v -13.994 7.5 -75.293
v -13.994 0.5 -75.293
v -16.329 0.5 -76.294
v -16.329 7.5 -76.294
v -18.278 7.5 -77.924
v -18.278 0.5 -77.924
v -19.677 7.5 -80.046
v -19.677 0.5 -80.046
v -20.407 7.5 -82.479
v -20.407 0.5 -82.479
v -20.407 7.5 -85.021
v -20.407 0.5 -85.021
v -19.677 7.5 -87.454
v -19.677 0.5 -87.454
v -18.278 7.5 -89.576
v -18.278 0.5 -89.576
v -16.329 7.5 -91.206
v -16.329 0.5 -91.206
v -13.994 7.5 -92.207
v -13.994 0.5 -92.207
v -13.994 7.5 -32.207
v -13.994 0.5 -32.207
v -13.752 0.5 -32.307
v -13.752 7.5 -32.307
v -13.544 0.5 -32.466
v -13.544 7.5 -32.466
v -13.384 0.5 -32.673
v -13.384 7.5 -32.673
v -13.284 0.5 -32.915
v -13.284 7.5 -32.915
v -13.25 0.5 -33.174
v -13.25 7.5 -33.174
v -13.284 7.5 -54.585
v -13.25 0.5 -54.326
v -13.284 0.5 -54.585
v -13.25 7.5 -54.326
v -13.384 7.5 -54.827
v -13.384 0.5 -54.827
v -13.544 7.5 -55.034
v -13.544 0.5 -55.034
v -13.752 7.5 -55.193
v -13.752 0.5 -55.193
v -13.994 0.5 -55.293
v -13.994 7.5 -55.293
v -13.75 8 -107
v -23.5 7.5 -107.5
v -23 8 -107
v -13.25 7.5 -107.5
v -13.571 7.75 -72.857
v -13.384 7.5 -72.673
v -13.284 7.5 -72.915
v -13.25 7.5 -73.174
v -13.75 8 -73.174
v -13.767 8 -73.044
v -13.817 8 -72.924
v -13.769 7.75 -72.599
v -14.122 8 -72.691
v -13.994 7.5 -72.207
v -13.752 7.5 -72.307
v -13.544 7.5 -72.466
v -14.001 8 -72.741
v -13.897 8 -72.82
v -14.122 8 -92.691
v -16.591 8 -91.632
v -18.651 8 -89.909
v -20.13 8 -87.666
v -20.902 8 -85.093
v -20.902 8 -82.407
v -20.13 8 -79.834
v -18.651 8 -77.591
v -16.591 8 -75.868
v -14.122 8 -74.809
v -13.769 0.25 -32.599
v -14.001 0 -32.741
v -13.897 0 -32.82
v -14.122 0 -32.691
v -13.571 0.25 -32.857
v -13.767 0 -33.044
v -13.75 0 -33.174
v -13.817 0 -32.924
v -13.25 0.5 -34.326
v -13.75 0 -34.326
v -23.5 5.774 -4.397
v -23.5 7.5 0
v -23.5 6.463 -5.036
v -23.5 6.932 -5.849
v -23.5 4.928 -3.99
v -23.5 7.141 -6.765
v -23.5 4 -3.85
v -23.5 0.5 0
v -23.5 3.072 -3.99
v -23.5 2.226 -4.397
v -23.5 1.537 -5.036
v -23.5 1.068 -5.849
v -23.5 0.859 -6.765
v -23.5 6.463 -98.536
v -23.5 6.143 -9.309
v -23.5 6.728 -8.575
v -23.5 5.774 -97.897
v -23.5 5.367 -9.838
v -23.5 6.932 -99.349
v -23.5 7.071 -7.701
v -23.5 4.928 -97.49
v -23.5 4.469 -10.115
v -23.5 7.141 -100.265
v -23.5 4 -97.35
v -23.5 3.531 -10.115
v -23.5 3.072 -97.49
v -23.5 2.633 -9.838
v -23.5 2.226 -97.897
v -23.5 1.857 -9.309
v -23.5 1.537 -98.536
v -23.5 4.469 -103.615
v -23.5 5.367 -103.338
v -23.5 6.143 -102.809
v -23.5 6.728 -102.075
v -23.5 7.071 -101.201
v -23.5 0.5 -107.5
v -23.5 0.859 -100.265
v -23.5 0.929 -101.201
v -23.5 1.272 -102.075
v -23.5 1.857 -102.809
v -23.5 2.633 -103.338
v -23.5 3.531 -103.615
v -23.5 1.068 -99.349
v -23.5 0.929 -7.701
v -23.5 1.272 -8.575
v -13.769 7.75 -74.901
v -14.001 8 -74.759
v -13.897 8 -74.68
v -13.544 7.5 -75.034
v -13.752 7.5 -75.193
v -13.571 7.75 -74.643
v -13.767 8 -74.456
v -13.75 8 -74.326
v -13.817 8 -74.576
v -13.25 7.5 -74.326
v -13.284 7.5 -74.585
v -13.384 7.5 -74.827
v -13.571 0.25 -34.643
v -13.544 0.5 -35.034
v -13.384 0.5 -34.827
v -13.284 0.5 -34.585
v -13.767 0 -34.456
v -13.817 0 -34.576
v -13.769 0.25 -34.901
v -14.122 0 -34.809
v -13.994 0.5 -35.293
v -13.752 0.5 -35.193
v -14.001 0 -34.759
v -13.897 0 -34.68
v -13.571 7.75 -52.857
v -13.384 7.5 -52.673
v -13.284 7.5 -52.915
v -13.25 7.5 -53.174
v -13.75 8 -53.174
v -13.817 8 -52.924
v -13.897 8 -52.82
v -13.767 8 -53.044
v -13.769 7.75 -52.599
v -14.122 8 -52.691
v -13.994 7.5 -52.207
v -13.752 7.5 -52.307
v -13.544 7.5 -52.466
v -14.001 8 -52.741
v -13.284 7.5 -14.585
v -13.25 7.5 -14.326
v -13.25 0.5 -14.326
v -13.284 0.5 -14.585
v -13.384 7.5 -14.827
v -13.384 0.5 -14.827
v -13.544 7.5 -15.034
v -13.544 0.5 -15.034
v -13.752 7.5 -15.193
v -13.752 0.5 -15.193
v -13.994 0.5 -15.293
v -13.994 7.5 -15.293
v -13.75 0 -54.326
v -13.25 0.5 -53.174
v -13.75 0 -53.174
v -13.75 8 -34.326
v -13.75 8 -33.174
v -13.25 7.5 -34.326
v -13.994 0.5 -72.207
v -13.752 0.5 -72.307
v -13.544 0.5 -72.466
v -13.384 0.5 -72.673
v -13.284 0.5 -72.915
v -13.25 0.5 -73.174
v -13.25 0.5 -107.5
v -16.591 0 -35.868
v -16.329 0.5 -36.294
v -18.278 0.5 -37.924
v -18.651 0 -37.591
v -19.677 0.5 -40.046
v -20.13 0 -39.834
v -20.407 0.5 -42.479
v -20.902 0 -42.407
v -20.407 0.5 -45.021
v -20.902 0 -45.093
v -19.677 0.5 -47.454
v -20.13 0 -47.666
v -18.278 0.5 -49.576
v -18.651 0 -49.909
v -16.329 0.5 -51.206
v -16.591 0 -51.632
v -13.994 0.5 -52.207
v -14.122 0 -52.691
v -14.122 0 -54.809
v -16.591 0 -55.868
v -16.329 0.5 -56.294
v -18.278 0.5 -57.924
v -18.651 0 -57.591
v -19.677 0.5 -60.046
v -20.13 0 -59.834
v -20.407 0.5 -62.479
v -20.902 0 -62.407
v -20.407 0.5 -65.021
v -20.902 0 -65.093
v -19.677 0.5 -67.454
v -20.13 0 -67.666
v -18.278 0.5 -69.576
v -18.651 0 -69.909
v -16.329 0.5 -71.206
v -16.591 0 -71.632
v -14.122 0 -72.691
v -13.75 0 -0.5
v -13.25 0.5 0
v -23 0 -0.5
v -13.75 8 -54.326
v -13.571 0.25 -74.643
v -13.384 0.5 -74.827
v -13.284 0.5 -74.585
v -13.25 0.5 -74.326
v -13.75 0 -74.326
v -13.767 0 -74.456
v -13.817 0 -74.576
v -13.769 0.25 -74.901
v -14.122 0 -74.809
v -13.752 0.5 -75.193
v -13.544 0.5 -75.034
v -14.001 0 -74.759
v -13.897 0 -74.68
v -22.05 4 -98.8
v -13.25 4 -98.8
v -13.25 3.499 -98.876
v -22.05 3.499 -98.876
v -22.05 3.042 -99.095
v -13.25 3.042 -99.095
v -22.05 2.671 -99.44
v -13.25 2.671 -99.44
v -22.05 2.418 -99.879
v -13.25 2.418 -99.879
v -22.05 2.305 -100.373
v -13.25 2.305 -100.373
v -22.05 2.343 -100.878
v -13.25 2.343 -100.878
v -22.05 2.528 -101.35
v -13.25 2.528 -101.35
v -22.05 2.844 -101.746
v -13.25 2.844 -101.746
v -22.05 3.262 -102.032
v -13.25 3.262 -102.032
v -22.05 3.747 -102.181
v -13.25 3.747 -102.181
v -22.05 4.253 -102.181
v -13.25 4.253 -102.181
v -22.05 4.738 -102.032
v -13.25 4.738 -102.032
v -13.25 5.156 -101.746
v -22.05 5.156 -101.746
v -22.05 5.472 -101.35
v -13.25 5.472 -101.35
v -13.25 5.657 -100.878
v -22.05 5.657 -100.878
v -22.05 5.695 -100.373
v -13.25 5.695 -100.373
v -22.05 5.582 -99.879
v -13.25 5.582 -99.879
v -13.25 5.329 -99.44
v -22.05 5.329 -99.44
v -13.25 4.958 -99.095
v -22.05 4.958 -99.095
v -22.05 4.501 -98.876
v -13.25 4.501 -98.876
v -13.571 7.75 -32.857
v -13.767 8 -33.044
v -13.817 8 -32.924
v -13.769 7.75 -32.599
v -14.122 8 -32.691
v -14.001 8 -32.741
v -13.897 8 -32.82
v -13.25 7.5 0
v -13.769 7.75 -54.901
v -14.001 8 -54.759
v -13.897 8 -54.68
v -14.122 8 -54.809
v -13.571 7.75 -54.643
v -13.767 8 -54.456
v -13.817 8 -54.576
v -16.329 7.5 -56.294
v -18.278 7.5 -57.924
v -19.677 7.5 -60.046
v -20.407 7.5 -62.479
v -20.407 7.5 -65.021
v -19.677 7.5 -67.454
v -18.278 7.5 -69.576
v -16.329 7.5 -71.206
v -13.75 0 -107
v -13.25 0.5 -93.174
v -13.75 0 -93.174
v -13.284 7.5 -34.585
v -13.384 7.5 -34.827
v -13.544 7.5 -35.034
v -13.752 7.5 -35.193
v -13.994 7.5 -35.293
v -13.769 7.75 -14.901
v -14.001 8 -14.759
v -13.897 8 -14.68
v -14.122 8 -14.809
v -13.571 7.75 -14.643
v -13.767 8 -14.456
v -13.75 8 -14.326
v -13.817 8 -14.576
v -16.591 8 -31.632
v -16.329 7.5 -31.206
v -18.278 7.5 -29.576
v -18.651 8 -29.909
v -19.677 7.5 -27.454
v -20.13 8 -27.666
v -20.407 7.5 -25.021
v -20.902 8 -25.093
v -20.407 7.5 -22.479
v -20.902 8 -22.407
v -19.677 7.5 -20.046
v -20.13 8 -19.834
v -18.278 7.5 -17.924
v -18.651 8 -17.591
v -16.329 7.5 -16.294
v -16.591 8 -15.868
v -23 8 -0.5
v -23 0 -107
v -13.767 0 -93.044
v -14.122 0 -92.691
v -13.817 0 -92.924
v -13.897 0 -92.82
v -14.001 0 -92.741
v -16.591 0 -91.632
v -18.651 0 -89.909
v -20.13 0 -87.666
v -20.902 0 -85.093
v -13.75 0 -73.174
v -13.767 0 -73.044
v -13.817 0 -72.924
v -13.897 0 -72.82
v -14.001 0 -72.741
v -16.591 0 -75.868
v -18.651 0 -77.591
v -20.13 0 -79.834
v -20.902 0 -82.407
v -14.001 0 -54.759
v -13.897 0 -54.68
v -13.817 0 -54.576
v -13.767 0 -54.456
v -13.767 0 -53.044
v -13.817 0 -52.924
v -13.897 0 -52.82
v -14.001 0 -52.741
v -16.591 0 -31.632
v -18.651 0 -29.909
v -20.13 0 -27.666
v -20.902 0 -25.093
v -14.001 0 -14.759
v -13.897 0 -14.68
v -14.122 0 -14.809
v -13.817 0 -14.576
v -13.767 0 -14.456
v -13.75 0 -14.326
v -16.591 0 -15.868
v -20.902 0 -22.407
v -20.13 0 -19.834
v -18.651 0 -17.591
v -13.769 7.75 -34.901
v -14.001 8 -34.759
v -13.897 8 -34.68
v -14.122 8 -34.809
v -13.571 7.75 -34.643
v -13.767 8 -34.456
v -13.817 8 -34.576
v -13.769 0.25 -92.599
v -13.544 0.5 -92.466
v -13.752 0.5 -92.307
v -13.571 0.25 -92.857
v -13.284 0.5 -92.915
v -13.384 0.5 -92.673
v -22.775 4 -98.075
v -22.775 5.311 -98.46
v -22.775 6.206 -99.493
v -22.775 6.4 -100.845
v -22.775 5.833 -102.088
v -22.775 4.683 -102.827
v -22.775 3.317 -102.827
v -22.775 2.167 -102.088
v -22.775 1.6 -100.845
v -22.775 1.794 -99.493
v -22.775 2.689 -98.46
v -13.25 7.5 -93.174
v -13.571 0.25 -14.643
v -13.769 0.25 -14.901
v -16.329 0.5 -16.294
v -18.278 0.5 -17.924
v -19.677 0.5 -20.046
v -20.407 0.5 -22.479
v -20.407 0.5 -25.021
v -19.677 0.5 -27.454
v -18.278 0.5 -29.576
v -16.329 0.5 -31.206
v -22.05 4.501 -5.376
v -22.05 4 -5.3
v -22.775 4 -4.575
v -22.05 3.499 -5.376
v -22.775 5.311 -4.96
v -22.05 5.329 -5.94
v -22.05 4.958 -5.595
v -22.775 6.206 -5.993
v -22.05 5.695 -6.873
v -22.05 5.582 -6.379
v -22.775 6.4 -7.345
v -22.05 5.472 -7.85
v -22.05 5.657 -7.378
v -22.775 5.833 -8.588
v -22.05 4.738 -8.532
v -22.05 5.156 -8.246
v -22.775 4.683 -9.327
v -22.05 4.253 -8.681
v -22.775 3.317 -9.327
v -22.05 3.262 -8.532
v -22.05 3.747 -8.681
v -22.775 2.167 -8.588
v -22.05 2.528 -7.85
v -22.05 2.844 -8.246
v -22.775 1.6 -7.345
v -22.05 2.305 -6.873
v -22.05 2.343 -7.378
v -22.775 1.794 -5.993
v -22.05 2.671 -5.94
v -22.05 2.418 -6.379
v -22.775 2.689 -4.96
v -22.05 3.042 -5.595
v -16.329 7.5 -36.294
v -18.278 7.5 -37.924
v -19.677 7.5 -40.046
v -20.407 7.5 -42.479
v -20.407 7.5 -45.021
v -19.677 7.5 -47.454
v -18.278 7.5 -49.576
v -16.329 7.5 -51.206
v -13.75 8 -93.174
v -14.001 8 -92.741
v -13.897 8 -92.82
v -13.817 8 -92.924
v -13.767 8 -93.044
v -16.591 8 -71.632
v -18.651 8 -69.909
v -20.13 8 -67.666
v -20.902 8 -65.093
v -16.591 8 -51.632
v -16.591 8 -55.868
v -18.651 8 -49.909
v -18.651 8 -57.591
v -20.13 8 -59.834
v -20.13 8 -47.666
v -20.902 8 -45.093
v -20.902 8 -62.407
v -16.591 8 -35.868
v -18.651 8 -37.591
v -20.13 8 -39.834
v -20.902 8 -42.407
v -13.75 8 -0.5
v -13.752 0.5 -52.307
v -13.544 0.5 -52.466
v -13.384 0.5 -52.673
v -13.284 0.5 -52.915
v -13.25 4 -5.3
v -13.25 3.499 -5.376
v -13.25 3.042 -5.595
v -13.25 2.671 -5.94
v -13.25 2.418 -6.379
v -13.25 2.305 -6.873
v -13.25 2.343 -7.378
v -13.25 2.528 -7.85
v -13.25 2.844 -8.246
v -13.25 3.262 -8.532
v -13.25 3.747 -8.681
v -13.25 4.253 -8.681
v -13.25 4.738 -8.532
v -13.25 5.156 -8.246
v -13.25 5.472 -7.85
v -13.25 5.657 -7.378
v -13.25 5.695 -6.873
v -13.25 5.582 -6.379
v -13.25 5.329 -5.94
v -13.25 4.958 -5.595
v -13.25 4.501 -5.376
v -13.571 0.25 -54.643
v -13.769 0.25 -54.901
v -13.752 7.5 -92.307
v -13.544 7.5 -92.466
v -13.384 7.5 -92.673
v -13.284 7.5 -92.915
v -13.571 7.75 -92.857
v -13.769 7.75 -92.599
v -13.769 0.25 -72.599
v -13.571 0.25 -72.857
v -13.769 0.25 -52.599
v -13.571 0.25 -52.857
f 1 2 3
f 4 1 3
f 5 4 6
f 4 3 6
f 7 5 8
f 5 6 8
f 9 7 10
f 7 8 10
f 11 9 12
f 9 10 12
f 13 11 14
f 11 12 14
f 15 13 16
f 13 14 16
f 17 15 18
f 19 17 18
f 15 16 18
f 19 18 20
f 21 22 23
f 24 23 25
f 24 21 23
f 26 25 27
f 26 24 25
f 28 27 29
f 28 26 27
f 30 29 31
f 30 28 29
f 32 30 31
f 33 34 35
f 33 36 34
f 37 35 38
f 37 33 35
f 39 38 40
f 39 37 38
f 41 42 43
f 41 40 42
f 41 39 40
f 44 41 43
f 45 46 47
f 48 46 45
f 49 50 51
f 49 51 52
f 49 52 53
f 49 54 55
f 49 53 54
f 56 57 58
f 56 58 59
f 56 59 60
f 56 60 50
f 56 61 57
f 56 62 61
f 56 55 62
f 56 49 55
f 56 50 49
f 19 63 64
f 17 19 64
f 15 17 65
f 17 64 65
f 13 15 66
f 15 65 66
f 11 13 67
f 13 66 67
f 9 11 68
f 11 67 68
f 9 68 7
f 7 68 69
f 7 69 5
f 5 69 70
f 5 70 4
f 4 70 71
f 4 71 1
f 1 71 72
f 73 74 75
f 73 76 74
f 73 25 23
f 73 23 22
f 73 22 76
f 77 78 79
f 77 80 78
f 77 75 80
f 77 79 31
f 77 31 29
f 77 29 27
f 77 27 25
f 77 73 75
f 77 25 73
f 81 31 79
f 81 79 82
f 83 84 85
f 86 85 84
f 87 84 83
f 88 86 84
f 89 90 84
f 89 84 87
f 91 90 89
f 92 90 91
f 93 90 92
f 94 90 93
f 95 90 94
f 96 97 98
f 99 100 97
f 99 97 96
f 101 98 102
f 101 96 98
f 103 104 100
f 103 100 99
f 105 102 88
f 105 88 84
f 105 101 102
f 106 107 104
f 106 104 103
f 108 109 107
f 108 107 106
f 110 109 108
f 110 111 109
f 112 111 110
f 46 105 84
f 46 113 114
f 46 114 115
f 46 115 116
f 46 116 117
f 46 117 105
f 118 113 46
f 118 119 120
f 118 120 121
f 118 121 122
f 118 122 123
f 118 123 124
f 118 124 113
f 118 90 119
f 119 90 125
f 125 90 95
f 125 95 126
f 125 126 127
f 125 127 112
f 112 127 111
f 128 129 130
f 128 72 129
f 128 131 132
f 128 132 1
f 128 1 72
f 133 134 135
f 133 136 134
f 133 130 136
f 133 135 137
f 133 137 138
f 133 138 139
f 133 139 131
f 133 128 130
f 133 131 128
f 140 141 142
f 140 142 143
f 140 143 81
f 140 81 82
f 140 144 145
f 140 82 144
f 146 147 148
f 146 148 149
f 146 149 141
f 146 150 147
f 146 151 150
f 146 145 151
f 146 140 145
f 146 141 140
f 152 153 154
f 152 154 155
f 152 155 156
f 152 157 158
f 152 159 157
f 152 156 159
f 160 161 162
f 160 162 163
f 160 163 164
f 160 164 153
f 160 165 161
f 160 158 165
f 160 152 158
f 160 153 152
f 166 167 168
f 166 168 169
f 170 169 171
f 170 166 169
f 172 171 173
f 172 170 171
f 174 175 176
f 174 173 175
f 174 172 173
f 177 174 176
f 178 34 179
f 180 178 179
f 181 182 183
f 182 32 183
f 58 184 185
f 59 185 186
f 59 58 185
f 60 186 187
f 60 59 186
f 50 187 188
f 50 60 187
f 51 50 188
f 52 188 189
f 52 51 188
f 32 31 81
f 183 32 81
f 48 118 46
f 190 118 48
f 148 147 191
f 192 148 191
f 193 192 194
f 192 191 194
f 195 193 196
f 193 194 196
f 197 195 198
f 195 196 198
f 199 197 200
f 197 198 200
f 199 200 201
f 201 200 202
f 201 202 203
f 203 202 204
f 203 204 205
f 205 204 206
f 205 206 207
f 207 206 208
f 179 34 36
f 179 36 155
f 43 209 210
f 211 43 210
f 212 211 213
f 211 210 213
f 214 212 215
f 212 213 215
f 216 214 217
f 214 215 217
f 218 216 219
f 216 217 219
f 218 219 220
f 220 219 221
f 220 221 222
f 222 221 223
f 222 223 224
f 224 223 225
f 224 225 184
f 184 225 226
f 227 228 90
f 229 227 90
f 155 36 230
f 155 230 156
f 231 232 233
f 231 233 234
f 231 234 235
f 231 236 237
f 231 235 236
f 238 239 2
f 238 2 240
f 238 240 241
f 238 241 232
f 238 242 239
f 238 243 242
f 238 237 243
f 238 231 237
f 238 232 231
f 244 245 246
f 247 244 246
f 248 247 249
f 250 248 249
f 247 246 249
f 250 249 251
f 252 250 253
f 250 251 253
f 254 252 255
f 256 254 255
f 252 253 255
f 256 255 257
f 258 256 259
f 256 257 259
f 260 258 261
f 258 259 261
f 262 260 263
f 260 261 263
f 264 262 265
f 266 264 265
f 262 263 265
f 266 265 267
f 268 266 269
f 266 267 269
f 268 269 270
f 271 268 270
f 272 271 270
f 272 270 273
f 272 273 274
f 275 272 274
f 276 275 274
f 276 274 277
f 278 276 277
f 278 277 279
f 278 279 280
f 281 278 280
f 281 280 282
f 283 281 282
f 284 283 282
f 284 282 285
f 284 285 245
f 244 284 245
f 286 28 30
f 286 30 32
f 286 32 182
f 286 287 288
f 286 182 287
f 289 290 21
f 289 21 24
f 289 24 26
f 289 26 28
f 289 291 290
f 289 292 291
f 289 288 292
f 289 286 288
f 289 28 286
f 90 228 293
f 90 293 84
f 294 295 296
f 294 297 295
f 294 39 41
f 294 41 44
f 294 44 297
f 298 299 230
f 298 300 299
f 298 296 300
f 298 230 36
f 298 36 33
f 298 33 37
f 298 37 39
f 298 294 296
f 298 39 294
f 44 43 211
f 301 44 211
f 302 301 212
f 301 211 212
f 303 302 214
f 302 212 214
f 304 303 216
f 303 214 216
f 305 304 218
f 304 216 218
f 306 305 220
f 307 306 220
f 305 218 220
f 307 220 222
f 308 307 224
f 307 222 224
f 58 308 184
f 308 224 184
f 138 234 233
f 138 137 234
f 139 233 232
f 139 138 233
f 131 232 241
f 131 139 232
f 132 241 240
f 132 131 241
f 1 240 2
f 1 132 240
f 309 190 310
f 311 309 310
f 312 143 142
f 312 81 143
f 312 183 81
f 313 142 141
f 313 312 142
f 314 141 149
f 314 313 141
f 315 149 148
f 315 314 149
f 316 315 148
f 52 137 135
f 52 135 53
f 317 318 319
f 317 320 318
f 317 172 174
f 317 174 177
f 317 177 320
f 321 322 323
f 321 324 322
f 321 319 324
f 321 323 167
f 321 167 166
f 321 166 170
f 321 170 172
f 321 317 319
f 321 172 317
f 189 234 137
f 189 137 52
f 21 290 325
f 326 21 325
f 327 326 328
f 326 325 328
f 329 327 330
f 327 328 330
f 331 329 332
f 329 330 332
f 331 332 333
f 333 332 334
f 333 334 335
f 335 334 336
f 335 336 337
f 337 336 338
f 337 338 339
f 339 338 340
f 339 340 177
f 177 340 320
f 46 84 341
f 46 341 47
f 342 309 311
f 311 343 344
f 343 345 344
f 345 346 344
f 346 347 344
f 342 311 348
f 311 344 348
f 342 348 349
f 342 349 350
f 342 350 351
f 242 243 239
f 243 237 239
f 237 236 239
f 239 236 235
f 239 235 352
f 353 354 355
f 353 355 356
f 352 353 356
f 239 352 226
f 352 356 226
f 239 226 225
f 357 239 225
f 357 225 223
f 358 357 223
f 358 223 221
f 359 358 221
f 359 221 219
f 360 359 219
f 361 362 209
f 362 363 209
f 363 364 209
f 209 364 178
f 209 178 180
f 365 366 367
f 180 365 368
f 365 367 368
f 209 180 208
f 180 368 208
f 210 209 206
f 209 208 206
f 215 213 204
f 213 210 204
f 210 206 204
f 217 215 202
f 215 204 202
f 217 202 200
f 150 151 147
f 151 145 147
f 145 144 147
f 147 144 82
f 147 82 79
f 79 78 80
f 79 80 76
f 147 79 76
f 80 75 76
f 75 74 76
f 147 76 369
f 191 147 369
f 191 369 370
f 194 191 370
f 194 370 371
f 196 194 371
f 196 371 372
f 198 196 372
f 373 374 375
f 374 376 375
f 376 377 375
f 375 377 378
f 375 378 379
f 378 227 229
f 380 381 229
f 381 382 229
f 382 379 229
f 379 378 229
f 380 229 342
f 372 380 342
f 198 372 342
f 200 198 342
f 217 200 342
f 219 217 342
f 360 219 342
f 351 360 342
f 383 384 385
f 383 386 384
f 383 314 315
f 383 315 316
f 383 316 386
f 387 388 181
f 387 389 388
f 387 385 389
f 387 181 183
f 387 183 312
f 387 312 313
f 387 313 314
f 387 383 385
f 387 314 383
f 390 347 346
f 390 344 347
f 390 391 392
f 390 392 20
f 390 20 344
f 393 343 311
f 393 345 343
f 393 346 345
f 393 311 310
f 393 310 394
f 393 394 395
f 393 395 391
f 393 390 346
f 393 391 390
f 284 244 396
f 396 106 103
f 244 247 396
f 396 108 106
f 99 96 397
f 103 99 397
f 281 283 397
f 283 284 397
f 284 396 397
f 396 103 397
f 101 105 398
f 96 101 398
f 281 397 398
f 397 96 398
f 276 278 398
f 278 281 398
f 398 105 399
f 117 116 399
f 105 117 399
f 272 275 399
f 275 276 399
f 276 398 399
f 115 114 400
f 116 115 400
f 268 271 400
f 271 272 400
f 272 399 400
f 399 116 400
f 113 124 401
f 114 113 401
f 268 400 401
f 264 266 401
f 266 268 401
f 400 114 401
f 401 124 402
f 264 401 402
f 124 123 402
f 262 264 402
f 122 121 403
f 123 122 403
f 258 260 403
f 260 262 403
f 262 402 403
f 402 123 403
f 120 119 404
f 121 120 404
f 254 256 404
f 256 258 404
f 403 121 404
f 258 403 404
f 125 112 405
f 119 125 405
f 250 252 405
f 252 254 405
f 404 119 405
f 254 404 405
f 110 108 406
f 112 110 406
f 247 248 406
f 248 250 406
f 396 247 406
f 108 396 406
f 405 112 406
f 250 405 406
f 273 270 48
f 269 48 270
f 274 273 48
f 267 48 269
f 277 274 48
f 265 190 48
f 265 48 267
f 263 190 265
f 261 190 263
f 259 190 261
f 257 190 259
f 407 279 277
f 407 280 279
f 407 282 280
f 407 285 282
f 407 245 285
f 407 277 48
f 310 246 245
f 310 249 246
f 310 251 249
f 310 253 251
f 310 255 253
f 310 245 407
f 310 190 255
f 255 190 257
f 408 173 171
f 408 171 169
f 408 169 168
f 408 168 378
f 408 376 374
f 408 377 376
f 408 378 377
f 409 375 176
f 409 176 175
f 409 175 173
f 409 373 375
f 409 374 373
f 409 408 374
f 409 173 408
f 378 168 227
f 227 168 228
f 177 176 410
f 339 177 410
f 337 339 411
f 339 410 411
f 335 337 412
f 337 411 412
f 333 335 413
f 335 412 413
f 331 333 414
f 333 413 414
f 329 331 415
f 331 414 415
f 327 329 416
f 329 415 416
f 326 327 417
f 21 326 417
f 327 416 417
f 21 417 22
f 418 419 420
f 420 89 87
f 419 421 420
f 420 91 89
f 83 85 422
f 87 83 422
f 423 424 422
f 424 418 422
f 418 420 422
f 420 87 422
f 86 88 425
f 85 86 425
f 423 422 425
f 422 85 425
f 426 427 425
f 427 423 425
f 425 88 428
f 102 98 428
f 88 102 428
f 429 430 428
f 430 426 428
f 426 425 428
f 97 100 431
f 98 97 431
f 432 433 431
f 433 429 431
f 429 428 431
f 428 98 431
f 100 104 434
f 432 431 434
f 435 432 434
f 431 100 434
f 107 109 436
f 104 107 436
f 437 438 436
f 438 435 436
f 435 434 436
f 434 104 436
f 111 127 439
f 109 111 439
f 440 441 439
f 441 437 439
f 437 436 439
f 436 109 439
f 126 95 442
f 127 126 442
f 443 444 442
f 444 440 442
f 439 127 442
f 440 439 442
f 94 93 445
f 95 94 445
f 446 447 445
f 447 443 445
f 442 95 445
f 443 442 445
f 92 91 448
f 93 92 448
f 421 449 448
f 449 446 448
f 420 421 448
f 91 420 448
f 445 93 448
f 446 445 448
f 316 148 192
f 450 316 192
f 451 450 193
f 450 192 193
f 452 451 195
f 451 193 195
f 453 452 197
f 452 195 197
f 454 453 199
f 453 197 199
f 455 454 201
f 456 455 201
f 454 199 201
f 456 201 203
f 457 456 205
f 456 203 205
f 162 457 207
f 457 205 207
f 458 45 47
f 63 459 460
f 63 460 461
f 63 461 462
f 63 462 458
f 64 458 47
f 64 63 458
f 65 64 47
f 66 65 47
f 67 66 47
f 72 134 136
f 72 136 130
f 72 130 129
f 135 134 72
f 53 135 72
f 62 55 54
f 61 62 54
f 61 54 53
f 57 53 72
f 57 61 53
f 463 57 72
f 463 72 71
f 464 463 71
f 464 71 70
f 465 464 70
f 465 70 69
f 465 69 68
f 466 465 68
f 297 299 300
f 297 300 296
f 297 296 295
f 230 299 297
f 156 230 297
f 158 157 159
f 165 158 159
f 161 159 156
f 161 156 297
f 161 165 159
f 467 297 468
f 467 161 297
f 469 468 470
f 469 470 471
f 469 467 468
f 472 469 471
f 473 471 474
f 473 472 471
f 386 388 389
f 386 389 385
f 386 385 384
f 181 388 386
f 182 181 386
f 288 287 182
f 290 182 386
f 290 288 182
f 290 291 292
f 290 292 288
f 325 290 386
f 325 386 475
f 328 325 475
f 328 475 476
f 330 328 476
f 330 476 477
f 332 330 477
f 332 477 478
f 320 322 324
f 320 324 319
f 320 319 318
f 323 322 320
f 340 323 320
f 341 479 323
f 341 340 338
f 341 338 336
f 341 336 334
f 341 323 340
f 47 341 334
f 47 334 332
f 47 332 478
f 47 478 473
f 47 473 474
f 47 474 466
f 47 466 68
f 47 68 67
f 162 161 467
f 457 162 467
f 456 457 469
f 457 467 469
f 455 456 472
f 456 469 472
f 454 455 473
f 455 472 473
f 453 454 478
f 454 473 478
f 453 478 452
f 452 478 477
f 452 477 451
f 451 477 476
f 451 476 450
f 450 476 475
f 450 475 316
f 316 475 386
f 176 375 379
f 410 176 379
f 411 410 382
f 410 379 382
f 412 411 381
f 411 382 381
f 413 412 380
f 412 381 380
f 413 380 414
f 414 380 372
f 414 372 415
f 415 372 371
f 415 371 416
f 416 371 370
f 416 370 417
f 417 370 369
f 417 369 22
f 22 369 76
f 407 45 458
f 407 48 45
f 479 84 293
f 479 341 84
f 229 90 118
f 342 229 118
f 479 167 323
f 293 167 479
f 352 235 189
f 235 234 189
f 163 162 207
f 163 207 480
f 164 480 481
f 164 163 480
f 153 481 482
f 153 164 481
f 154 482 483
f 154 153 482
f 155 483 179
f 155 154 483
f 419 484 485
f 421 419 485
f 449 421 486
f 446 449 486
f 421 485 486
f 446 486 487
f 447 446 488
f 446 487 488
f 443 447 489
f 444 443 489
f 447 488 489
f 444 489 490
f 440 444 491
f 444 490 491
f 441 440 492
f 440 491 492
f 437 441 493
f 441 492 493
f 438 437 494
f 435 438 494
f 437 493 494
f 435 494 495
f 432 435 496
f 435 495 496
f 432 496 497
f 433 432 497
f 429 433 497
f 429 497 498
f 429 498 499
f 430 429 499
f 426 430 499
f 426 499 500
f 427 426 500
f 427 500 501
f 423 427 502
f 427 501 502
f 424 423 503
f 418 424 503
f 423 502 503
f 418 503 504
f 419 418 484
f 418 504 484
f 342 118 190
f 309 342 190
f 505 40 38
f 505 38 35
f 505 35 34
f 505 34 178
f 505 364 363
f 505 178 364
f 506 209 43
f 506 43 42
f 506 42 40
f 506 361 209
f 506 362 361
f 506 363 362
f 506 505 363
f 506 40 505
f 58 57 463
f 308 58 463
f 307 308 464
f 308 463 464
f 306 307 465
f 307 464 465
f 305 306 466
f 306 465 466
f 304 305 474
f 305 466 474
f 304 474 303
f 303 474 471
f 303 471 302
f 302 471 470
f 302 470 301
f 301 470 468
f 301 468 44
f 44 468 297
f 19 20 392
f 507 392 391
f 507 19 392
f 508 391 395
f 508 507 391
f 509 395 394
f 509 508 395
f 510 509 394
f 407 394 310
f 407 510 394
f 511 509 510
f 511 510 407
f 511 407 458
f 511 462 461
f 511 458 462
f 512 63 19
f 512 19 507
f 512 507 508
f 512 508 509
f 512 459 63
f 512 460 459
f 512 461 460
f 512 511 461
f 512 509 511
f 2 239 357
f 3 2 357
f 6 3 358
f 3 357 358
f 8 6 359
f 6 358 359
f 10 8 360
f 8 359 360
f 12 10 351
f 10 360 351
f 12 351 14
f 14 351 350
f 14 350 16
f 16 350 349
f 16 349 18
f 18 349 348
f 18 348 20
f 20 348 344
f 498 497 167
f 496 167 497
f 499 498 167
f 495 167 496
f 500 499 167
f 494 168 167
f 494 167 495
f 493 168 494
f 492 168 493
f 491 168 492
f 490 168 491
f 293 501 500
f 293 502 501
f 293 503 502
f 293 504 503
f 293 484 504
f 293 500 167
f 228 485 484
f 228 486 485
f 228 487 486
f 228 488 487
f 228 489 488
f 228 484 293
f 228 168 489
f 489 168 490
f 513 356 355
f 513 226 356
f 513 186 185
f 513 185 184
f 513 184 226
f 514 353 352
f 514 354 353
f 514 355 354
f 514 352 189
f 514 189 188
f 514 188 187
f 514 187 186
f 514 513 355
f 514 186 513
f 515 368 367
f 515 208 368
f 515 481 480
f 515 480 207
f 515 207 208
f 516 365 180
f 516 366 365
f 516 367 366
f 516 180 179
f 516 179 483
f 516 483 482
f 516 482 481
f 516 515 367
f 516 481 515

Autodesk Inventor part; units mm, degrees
ref_plane "YZ Plane" through (0, 0, 0) normal (1, 0, 0) x (0, 1, 0)
ref_plane "XZ Plane" through (0, 0, 0) normal (0, 1, 0) x (-1, 0, 0)
ref_plane "XY Plane" through (0, 0, 0) normal (0, 0, 1) x (1, 0, 0)
sketch "Sketch1" plane through (0, 0, 0) normal (0, 1, 0) x (-1, 0, 0)
  line L0 (0, 0) -> (11.75, 0)
  line L1 (11.75, 0) -> (11.75, -102.5)
  line L2 (10.25, -107.5) -> (0, -107.5)
  line L3 (0, -107.5) -> (0, 0)
  circle A0 centre (11.75, -23.75) radius 8.75
  circle A1 centre (11.75, -43.75) radius 8.75
  circle A2 centre (11.75, -63.75) radius 8.75
  circle A3 centre (11.75, -83.75) radius 8.75
  line L4 (11.75, 0) -> (23.5, 0)
  line L5 (23.5, 0) -> (23.5, -107.5)
  line L6 (23.5, -107.5) -> (13.25, -107.5)
  line L7 (13.25, -107.5) -> (13.25, -92.3705)
  line L8 (13.25, -75.1295) -> (13.25, -72.3705)
  line L9 (13.25, -55.1295) -> (13.25, -52.3705)
  line L10 (13.25, -32.3705) -> (13.25, -35.1295)
  line L11 (13.25, -15.1295) -> (13.25, 0)
  line L12 (10.25, 0) -> (10.25, -15.1295)
  line L13 (10.25, -32.3705) -> (10.25, -35.1295)
  line L14 (10.25, -52.3705) -> (10.25, -55.1295)
  line L15 (10.25, -72.3705) -> (10.25, -75.1295)
  line L16 (10.25, -92.3705) -> (10.25, -107.5)
  point P0 (11.75, -92.5)
  point P1 (11.75, -75)
  point P2 (11.75, -72.5)
  point P3 (11.75, -55)
  point P4 (11.75, -52.5)
  point P5 (11.75, -35)
  point P6 (11.75, -32.5)
  point P7 (11.75, -15)
  dimension "d0" = 17.5
  dimension "d4" = 20
  dimension "d9" = 3
  dimension "d11" = 15
  dimension "d12" = 15
  dimension "d16" = 1.5
  dimension "d17" = 3
  dimension "d19" = 1.5
extrude "Extrusion1" add sketch "Sketch1" along normal blind 8 contours L4 L5 L6 L7 A3 L8 A2 L9 A1 L10 A0 L11
sketch "Sketch3" plane through (-23.5, 0, -107.5) normal (-1, 0, 0) x (0, 0, 1)
  line L0 (0, 0) -> (0, 8) projected
  line L1 (0, 8) -> (107.5, 8) projected
  line L2 (107.5, 0) -> (107.5, 8) projected
  point P0 (7, 4)
  point P1 (100.5, 4)
  point P2 (107.5, 4)
  dimension "d27" = 7
  dimension "d28" = 8
  dimension "d29" = 4
  dimension "d33" = 7
hole "Hole1" at (-23.5, 4, -100.5) at (-23.5, 4, -7) direction (1, 0, 0) diameter 3.4 end through all countersink diameter 6.3 countersink angle 90 clearance for "Flat Head Machine Screw" size "M3" standard "Ansi Metric M Profile"
fillet "Fillet1" radius 1 8 edges at (-13.25, 4, -92.3705) (-13.25, 4, -72.3705) (-13.25, 4, -75.1295) (-13.25, 4, -55.1295) (-13.25, 4, -52.3705) (-13.25, 4, -35.1295) (-13.25, 4, -32.3705) (-13.25, 4, -15.1295)
chamfer "Chamfer1" distance 0.5 angle 45 40 edges at (-20.5, 0, -83.75) (-13.4574, 0, -92.5643) (-13.25, 0, -100.337) (-13.4574, 0, -74.9357) (-13.25, 0, -73.75) (-13.4574, 0, -72.5643) (-20.5, 0, -63.75) (-13.4574, 0, -54.9357) (-13.25, 0, -53.75) (-13.4574, 0, -52.5643) (-20.5, 0, -43.75) (-13.4574, 0, -34.9357) (-13.25, 0, -33.75) (-13.4574, 0, -32.5643) (-20.5, 0, -23.75) (-13.4574, 0, -14.9357) (-13.25, 0, -7.163) (-23.5, 0, -53.75) (-18.375, 0, -107.5) (-18.375, 0, 0) (-23.5, 8, -53.75) (-20.5, 8, -23.75) (-13.4574, 8, -32.5643) (-13.25, 8, -33.75) (-13.4574, 8, -34.9357) (-20.5, 8, -43.75) (-13.4574, 8, -52.5643) (-13.25, 8, -53.75) (-13.4574, 8, -54.9357) (-20.5, 8, -63.75) (-13.4574, 8, -72.5643) (-13.25, 8, -73.75) (-13.4574, 8, -74.9357) (-20.5, 8, -83.75) (-13.4574, 8, -92.5643) (-13.25, 8, -100.337) (-13.4574, 8, -14.9357) (-13.25, 8, -7.163) (-18.375, 8, -107.5) (-18.375, 8, 0)
equation "\"d12\" = d11"
equation "\"d19\" = d16"
equation "\"d29\" = 0.5 * d28"
equation "\"d33\" = d27"
properties part number "BatteryHolder" material "Aluminum 6061"
